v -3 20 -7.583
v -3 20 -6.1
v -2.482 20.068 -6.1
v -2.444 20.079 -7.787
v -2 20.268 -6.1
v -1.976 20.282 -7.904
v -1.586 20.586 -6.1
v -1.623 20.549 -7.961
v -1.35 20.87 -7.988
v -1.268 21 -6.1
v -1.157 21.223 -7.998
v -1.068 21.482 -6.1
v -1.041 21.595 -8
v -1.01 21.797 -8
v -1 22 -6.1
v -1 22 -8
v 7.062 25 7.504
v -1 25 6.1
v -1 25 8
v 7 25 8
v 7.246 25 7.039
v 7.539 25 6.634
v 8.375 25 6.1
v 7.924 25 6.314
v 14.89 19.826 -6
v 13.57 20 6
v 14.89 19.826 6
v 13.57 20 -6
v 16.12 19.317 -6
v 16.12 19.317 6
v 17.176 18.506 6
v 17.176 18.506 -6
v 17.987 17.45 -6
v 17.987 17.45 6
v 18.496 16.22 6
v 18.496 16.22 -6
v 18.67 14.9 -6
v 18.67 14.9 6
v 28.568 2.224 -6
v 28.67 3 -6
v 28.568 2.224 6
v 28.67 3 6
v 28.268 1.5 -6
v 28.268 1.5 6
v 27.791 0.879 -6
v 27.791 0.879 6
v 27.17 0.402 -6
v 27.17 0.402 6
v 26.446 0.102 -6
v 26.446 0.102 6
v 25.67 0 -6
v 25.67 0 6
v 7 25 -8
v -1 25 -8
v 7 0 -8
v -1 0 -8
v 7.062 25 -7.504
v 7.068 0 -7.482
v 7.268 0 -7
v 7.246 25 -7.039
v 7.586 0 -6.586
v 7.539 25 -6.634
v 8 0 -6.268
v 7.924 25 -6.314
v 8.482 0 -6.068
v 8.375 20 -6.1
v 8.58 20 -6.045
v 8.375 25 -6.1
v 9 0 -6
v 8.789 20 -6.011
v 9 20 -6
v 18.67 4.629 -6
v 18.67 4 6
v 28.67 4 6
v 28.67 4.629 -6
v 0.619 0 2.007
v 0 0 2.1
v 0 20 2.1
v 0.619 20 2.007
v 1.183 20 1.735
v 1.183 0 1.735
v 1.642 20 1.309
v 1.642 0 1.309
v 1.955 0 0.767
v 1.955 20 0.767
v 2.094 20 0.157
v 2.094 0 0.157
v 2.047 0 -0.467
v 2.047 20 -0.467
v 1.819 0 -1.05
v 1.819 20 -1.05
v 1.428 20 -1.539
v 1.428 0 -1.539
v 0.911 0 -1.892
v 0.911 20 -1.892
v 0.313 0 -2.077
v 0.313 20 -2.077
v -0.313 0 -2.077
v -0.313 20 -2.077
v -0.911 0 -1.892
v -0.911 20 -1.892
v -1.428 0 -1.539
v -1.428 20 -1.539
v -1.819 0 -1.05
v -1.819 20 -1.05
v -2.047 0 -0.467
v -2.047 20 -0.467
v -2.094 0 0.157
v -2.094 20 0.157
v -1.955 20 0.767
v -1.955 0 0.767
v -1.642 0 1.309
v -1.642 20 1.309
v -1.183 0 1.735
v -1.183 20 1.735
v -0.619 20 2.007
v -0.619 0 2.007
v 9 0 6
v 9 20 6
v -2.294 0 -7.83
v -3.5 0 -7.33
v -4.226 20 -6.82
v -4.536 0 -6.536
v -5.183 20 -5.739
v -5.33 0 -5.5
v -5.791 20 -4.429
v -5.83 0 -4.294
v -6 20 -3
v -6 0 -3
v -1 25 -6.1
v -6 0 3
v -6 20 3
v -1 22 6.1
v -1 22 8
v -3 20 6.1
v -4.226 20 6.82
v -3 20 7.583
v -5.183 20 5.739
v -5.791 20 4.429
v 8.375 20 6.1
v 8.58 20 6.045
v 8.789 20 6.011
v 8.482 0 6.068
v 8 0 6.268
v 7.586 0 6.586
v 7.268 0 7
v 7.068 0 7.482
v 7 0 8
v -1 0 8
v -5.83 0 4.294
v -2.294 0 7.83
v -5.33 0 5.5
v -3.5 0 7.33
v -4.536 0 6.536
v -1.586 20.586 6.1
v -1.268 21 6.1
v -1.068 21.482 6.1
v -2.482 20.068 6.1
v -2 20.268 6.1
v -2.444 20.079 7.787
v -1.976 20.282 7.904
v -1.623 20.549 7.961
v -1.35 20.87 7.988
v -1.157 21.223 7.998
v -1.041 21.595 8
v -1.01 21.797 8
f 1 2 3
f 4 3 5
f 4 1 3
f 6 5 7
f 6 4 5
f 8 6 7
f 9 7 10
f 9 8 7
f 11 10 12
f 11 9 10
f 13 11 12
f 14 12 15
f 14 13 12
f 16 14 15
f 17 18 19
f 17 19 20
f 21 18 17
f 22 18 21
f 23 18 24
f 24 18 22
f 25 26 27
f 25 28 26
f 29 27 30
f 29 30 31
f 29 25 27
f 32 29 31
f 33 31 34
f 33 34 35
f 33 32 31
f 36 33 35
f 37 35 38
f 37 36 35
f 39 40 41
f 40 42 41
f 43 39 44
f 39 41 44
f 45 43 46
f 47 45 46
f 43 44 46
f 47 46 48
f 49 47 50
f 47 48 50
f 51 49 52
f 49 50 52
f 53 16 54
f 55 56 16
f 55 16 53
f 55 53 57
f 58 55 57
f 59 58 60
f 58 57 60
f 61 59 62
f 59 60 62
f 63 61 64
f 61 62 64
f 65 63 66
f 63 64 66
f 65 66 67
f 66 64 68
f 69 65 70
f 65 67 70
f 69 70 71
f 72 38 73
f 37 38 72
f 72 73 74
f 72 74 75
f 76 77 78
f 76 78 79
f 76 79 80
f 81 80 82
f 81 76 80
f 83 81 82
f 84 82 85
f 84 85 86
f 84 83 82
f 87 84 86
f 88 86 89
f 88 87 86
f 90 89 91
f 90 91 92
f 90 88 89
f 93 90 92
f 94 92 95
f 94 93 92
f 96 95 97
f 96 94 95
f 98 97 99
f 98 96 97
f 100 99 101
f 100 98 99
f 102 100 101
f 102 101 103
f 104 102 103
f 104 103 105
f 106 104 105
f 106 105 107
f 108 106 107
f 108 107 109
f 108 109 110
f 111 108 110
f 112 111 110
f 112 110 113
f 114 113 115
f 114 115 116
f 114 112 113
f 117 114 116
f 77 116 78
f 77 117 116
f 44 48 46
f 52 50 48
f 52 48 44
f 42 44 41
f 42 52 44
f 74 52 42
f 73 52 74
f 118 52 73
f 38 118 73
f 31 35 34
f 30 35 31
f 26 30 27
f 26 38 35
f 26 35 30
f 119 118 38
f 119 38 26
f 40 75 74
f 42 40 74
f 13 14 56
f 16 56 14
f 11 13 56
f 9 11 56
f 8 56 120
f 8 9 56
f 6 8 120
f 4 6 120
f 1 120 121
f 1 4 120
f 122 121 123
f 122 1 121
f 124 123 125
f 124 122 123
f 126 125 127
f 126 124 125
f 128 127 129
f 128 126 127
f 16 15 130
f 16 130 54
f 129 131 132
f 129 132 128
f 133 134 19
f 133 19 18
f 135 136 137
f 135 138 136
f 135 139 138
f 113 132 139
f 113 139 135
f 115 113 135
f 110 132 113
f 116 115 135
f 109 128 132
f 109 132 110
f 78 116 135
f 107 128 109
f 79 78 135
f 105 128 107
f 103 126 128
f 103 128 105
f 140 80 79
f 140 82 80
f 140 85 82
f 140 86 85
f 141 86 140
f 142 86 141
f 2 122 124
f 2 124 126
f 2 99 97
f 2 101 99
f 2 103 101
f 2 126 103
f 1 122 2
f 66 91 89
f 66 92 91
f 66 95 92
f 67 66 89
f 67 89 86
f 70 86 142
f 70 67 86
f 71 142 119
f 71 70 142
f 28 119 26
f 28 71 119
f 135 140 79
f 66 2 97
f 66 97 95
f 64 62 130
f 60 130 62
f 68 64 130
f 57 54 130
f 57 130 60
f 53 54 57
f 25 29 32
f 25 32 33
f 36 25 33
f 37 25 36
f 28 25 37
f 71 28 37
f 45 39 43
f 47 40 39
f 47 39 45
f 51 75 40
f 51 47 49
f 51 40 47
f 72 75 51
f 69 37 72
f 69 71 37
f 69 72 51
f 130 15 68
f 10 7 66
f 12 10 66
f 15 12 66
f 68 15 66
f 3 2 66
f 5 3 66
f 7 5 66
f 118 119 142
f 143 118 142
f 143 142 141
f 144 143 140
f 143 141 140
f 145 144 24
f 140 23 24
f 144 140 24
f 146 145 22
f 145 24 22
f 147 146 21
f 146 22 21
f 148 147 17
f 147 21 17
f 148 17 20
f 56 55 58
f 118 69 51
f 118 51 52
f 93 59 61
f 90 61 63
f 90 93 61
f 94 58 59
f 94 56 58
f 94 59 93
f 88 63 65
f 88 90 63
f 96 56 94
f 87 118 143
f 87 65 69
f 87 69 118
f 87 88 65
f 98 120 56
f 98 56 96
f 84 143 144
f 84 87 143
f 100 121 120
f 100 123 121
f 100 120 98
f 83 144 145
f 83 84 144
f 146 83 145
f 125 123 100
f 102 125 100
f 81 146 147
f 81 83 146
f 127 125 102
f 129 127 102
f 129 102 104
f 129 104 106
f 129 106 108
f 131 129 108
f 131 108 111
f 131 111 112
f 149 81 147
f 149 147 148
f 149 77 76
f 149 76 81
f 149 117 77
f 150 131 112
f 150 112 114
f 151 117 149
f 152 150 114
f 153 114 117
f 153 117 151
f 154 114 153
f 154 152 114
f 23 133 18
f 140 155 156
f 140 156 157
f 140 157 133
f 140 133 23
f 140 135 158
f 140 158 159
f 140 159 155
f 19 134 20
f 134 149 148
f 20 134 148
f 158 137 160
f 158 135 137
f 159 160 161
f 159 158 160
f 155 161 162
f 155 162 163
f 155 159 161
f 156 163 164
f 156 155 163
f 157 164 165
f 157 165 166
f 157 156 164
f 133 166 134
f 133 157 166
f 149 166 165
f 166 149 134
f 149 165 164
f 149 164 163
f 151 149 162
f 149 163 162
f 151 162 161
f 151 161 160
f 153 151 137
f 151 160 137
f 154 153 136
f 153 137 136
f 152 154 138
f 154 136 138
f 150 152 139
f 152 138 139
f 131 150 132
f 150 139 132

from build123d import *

# Parameters (mm, degrees)
SKETCH1_W           = 12
SKETCH1_H           = 16
SKETCH1_R           = 2.1
SKETCH1_W_2         = 1
BOSS_EXTRUDE1_DEPTH = 20
FILLET1_R           = 5
SKETCH2_W           = 8
SKETCH2_H           = 1.9
BOSS_EXTRUDE2_DEPTH = 5
SKETCH4_W           = 12
SKETCH4_H           = 20
BOSS_EXTRUDE3_DEPTH = 11.67
FILLET2_R           = 5.1
FILLET4_R           = 2
FILLET6_R           = 2
BOSS_EXTRUDE4_DEPTH = 10
FILLET7_R           = 3


with BuildPart() as part:
    # Sketch1 → Boss-Extrude1 (new body)
    # profile 1 of 2: a face of its own
    with BuildSketch(Plane(origin=(0, 0, 0), x_dir=(1, 0, 0), z_dir=(0, 1, 0))):
        Rectangle(SKETCH1_W, SKETCH1_H)
        with Locations(Location((0, 0, 0), (0, 0, 270))):
            Circle(SKETCH1_R, mode=Mode.SUBTRACT)
    # profile 2 of 2: a face of its own
    with BuildSketch(Plane(origin=(0, 0, 0), x_dir=(1, 0, 0), z_dir=(0, 1, 0))):
        with Locations((6.5, 0)):
            Rectangle(SKETCH1_W_2, SKETCH1_H)
    extrude(amount=BOSS_EXTRUDE1_DEPTH)

    # Fillet1
    fillet1_edges = [part.edges().sort_by_distance(p)[0] for p in [
        (-6, 10, 8),
        (-6, 10, -8),
    ]]
    fillet(fillet1_edges, radius=FILLET1_R)

    # Sketch2 → Boss-Extrude2 (add)
    with BuildSketch(Plane(origin=(0, 20, 0), x_dir=(1, 0, 0), z_dir=(0, 1, 0))):
        with Locations((3, 7.05)):
            Rectangle(SKETCH2_W, SKETCH2_H)
        with Locations((3, -7.05)):
            Rectangle(SKETCH2_W, SKETCH2_H)
    extrude(amount=BOSS_EXTRUDE2_DEPTH)

    # Sketch4 → Boss-Extrude3 (add)
    with BuildSketch(Plane(origin=(7, 0, 0), x_dir=(0, 0, -1), z_dir=(1, 0, 0))):
        with Locations((0, 10)):
            Rectangle(SKETCH4_W, SKETCH4_H)
    extrude(amount=BOSS_EXTRUDE3_DEPTH)

    # Fillet2
    fillet2_edges = [part.edges().sort_by_distance(p)[0] for p in [
        (18.67, 20, 0),
    ]]
    fillet(fillet2_edges, radius=FILLET2_R)

    # Fillet4
    fillet4_edges = [part.edges().sort_by_distance(p)[0] for p in [
        (-1, 20, -7.05),
        (-1, 20, 7.05),
    ]]
    fillet(fillet4_edges, radius=FILLET4_R)

    # Fillet6
    fillet6_edges = [part.edges().sort_by_distance(p)[0] for p in [
        (7, 10, -6),
        (7, 10, 6),
    ]]
    fillet(fillet6_edges, radius=FILLET6_R - 0.0001)  # a hair under: the kernel refuses the full size

    # Sketch5 → Boss-Extrude4 (add)
    with BuildSketch(Plane(origin=(18.67, 0, 0), x_dir=(0, 0, -1), z_dir=(1, 0, 0))):
        Polygon((-6, 4), (6, 4.628893351), (6, 0), (-6, 0), align=None)
    extrude(amount=BOSS_EXTRUDE4_DEPTH)

    # Fillet7
    fillet7_edges = [part.edges().sort_by_distance(p)[0] for p in [
        (28.67, 0, 0),
    ]]
    fillet(fillet7_edges, radius=FILLET7_R)


solid = part.part
